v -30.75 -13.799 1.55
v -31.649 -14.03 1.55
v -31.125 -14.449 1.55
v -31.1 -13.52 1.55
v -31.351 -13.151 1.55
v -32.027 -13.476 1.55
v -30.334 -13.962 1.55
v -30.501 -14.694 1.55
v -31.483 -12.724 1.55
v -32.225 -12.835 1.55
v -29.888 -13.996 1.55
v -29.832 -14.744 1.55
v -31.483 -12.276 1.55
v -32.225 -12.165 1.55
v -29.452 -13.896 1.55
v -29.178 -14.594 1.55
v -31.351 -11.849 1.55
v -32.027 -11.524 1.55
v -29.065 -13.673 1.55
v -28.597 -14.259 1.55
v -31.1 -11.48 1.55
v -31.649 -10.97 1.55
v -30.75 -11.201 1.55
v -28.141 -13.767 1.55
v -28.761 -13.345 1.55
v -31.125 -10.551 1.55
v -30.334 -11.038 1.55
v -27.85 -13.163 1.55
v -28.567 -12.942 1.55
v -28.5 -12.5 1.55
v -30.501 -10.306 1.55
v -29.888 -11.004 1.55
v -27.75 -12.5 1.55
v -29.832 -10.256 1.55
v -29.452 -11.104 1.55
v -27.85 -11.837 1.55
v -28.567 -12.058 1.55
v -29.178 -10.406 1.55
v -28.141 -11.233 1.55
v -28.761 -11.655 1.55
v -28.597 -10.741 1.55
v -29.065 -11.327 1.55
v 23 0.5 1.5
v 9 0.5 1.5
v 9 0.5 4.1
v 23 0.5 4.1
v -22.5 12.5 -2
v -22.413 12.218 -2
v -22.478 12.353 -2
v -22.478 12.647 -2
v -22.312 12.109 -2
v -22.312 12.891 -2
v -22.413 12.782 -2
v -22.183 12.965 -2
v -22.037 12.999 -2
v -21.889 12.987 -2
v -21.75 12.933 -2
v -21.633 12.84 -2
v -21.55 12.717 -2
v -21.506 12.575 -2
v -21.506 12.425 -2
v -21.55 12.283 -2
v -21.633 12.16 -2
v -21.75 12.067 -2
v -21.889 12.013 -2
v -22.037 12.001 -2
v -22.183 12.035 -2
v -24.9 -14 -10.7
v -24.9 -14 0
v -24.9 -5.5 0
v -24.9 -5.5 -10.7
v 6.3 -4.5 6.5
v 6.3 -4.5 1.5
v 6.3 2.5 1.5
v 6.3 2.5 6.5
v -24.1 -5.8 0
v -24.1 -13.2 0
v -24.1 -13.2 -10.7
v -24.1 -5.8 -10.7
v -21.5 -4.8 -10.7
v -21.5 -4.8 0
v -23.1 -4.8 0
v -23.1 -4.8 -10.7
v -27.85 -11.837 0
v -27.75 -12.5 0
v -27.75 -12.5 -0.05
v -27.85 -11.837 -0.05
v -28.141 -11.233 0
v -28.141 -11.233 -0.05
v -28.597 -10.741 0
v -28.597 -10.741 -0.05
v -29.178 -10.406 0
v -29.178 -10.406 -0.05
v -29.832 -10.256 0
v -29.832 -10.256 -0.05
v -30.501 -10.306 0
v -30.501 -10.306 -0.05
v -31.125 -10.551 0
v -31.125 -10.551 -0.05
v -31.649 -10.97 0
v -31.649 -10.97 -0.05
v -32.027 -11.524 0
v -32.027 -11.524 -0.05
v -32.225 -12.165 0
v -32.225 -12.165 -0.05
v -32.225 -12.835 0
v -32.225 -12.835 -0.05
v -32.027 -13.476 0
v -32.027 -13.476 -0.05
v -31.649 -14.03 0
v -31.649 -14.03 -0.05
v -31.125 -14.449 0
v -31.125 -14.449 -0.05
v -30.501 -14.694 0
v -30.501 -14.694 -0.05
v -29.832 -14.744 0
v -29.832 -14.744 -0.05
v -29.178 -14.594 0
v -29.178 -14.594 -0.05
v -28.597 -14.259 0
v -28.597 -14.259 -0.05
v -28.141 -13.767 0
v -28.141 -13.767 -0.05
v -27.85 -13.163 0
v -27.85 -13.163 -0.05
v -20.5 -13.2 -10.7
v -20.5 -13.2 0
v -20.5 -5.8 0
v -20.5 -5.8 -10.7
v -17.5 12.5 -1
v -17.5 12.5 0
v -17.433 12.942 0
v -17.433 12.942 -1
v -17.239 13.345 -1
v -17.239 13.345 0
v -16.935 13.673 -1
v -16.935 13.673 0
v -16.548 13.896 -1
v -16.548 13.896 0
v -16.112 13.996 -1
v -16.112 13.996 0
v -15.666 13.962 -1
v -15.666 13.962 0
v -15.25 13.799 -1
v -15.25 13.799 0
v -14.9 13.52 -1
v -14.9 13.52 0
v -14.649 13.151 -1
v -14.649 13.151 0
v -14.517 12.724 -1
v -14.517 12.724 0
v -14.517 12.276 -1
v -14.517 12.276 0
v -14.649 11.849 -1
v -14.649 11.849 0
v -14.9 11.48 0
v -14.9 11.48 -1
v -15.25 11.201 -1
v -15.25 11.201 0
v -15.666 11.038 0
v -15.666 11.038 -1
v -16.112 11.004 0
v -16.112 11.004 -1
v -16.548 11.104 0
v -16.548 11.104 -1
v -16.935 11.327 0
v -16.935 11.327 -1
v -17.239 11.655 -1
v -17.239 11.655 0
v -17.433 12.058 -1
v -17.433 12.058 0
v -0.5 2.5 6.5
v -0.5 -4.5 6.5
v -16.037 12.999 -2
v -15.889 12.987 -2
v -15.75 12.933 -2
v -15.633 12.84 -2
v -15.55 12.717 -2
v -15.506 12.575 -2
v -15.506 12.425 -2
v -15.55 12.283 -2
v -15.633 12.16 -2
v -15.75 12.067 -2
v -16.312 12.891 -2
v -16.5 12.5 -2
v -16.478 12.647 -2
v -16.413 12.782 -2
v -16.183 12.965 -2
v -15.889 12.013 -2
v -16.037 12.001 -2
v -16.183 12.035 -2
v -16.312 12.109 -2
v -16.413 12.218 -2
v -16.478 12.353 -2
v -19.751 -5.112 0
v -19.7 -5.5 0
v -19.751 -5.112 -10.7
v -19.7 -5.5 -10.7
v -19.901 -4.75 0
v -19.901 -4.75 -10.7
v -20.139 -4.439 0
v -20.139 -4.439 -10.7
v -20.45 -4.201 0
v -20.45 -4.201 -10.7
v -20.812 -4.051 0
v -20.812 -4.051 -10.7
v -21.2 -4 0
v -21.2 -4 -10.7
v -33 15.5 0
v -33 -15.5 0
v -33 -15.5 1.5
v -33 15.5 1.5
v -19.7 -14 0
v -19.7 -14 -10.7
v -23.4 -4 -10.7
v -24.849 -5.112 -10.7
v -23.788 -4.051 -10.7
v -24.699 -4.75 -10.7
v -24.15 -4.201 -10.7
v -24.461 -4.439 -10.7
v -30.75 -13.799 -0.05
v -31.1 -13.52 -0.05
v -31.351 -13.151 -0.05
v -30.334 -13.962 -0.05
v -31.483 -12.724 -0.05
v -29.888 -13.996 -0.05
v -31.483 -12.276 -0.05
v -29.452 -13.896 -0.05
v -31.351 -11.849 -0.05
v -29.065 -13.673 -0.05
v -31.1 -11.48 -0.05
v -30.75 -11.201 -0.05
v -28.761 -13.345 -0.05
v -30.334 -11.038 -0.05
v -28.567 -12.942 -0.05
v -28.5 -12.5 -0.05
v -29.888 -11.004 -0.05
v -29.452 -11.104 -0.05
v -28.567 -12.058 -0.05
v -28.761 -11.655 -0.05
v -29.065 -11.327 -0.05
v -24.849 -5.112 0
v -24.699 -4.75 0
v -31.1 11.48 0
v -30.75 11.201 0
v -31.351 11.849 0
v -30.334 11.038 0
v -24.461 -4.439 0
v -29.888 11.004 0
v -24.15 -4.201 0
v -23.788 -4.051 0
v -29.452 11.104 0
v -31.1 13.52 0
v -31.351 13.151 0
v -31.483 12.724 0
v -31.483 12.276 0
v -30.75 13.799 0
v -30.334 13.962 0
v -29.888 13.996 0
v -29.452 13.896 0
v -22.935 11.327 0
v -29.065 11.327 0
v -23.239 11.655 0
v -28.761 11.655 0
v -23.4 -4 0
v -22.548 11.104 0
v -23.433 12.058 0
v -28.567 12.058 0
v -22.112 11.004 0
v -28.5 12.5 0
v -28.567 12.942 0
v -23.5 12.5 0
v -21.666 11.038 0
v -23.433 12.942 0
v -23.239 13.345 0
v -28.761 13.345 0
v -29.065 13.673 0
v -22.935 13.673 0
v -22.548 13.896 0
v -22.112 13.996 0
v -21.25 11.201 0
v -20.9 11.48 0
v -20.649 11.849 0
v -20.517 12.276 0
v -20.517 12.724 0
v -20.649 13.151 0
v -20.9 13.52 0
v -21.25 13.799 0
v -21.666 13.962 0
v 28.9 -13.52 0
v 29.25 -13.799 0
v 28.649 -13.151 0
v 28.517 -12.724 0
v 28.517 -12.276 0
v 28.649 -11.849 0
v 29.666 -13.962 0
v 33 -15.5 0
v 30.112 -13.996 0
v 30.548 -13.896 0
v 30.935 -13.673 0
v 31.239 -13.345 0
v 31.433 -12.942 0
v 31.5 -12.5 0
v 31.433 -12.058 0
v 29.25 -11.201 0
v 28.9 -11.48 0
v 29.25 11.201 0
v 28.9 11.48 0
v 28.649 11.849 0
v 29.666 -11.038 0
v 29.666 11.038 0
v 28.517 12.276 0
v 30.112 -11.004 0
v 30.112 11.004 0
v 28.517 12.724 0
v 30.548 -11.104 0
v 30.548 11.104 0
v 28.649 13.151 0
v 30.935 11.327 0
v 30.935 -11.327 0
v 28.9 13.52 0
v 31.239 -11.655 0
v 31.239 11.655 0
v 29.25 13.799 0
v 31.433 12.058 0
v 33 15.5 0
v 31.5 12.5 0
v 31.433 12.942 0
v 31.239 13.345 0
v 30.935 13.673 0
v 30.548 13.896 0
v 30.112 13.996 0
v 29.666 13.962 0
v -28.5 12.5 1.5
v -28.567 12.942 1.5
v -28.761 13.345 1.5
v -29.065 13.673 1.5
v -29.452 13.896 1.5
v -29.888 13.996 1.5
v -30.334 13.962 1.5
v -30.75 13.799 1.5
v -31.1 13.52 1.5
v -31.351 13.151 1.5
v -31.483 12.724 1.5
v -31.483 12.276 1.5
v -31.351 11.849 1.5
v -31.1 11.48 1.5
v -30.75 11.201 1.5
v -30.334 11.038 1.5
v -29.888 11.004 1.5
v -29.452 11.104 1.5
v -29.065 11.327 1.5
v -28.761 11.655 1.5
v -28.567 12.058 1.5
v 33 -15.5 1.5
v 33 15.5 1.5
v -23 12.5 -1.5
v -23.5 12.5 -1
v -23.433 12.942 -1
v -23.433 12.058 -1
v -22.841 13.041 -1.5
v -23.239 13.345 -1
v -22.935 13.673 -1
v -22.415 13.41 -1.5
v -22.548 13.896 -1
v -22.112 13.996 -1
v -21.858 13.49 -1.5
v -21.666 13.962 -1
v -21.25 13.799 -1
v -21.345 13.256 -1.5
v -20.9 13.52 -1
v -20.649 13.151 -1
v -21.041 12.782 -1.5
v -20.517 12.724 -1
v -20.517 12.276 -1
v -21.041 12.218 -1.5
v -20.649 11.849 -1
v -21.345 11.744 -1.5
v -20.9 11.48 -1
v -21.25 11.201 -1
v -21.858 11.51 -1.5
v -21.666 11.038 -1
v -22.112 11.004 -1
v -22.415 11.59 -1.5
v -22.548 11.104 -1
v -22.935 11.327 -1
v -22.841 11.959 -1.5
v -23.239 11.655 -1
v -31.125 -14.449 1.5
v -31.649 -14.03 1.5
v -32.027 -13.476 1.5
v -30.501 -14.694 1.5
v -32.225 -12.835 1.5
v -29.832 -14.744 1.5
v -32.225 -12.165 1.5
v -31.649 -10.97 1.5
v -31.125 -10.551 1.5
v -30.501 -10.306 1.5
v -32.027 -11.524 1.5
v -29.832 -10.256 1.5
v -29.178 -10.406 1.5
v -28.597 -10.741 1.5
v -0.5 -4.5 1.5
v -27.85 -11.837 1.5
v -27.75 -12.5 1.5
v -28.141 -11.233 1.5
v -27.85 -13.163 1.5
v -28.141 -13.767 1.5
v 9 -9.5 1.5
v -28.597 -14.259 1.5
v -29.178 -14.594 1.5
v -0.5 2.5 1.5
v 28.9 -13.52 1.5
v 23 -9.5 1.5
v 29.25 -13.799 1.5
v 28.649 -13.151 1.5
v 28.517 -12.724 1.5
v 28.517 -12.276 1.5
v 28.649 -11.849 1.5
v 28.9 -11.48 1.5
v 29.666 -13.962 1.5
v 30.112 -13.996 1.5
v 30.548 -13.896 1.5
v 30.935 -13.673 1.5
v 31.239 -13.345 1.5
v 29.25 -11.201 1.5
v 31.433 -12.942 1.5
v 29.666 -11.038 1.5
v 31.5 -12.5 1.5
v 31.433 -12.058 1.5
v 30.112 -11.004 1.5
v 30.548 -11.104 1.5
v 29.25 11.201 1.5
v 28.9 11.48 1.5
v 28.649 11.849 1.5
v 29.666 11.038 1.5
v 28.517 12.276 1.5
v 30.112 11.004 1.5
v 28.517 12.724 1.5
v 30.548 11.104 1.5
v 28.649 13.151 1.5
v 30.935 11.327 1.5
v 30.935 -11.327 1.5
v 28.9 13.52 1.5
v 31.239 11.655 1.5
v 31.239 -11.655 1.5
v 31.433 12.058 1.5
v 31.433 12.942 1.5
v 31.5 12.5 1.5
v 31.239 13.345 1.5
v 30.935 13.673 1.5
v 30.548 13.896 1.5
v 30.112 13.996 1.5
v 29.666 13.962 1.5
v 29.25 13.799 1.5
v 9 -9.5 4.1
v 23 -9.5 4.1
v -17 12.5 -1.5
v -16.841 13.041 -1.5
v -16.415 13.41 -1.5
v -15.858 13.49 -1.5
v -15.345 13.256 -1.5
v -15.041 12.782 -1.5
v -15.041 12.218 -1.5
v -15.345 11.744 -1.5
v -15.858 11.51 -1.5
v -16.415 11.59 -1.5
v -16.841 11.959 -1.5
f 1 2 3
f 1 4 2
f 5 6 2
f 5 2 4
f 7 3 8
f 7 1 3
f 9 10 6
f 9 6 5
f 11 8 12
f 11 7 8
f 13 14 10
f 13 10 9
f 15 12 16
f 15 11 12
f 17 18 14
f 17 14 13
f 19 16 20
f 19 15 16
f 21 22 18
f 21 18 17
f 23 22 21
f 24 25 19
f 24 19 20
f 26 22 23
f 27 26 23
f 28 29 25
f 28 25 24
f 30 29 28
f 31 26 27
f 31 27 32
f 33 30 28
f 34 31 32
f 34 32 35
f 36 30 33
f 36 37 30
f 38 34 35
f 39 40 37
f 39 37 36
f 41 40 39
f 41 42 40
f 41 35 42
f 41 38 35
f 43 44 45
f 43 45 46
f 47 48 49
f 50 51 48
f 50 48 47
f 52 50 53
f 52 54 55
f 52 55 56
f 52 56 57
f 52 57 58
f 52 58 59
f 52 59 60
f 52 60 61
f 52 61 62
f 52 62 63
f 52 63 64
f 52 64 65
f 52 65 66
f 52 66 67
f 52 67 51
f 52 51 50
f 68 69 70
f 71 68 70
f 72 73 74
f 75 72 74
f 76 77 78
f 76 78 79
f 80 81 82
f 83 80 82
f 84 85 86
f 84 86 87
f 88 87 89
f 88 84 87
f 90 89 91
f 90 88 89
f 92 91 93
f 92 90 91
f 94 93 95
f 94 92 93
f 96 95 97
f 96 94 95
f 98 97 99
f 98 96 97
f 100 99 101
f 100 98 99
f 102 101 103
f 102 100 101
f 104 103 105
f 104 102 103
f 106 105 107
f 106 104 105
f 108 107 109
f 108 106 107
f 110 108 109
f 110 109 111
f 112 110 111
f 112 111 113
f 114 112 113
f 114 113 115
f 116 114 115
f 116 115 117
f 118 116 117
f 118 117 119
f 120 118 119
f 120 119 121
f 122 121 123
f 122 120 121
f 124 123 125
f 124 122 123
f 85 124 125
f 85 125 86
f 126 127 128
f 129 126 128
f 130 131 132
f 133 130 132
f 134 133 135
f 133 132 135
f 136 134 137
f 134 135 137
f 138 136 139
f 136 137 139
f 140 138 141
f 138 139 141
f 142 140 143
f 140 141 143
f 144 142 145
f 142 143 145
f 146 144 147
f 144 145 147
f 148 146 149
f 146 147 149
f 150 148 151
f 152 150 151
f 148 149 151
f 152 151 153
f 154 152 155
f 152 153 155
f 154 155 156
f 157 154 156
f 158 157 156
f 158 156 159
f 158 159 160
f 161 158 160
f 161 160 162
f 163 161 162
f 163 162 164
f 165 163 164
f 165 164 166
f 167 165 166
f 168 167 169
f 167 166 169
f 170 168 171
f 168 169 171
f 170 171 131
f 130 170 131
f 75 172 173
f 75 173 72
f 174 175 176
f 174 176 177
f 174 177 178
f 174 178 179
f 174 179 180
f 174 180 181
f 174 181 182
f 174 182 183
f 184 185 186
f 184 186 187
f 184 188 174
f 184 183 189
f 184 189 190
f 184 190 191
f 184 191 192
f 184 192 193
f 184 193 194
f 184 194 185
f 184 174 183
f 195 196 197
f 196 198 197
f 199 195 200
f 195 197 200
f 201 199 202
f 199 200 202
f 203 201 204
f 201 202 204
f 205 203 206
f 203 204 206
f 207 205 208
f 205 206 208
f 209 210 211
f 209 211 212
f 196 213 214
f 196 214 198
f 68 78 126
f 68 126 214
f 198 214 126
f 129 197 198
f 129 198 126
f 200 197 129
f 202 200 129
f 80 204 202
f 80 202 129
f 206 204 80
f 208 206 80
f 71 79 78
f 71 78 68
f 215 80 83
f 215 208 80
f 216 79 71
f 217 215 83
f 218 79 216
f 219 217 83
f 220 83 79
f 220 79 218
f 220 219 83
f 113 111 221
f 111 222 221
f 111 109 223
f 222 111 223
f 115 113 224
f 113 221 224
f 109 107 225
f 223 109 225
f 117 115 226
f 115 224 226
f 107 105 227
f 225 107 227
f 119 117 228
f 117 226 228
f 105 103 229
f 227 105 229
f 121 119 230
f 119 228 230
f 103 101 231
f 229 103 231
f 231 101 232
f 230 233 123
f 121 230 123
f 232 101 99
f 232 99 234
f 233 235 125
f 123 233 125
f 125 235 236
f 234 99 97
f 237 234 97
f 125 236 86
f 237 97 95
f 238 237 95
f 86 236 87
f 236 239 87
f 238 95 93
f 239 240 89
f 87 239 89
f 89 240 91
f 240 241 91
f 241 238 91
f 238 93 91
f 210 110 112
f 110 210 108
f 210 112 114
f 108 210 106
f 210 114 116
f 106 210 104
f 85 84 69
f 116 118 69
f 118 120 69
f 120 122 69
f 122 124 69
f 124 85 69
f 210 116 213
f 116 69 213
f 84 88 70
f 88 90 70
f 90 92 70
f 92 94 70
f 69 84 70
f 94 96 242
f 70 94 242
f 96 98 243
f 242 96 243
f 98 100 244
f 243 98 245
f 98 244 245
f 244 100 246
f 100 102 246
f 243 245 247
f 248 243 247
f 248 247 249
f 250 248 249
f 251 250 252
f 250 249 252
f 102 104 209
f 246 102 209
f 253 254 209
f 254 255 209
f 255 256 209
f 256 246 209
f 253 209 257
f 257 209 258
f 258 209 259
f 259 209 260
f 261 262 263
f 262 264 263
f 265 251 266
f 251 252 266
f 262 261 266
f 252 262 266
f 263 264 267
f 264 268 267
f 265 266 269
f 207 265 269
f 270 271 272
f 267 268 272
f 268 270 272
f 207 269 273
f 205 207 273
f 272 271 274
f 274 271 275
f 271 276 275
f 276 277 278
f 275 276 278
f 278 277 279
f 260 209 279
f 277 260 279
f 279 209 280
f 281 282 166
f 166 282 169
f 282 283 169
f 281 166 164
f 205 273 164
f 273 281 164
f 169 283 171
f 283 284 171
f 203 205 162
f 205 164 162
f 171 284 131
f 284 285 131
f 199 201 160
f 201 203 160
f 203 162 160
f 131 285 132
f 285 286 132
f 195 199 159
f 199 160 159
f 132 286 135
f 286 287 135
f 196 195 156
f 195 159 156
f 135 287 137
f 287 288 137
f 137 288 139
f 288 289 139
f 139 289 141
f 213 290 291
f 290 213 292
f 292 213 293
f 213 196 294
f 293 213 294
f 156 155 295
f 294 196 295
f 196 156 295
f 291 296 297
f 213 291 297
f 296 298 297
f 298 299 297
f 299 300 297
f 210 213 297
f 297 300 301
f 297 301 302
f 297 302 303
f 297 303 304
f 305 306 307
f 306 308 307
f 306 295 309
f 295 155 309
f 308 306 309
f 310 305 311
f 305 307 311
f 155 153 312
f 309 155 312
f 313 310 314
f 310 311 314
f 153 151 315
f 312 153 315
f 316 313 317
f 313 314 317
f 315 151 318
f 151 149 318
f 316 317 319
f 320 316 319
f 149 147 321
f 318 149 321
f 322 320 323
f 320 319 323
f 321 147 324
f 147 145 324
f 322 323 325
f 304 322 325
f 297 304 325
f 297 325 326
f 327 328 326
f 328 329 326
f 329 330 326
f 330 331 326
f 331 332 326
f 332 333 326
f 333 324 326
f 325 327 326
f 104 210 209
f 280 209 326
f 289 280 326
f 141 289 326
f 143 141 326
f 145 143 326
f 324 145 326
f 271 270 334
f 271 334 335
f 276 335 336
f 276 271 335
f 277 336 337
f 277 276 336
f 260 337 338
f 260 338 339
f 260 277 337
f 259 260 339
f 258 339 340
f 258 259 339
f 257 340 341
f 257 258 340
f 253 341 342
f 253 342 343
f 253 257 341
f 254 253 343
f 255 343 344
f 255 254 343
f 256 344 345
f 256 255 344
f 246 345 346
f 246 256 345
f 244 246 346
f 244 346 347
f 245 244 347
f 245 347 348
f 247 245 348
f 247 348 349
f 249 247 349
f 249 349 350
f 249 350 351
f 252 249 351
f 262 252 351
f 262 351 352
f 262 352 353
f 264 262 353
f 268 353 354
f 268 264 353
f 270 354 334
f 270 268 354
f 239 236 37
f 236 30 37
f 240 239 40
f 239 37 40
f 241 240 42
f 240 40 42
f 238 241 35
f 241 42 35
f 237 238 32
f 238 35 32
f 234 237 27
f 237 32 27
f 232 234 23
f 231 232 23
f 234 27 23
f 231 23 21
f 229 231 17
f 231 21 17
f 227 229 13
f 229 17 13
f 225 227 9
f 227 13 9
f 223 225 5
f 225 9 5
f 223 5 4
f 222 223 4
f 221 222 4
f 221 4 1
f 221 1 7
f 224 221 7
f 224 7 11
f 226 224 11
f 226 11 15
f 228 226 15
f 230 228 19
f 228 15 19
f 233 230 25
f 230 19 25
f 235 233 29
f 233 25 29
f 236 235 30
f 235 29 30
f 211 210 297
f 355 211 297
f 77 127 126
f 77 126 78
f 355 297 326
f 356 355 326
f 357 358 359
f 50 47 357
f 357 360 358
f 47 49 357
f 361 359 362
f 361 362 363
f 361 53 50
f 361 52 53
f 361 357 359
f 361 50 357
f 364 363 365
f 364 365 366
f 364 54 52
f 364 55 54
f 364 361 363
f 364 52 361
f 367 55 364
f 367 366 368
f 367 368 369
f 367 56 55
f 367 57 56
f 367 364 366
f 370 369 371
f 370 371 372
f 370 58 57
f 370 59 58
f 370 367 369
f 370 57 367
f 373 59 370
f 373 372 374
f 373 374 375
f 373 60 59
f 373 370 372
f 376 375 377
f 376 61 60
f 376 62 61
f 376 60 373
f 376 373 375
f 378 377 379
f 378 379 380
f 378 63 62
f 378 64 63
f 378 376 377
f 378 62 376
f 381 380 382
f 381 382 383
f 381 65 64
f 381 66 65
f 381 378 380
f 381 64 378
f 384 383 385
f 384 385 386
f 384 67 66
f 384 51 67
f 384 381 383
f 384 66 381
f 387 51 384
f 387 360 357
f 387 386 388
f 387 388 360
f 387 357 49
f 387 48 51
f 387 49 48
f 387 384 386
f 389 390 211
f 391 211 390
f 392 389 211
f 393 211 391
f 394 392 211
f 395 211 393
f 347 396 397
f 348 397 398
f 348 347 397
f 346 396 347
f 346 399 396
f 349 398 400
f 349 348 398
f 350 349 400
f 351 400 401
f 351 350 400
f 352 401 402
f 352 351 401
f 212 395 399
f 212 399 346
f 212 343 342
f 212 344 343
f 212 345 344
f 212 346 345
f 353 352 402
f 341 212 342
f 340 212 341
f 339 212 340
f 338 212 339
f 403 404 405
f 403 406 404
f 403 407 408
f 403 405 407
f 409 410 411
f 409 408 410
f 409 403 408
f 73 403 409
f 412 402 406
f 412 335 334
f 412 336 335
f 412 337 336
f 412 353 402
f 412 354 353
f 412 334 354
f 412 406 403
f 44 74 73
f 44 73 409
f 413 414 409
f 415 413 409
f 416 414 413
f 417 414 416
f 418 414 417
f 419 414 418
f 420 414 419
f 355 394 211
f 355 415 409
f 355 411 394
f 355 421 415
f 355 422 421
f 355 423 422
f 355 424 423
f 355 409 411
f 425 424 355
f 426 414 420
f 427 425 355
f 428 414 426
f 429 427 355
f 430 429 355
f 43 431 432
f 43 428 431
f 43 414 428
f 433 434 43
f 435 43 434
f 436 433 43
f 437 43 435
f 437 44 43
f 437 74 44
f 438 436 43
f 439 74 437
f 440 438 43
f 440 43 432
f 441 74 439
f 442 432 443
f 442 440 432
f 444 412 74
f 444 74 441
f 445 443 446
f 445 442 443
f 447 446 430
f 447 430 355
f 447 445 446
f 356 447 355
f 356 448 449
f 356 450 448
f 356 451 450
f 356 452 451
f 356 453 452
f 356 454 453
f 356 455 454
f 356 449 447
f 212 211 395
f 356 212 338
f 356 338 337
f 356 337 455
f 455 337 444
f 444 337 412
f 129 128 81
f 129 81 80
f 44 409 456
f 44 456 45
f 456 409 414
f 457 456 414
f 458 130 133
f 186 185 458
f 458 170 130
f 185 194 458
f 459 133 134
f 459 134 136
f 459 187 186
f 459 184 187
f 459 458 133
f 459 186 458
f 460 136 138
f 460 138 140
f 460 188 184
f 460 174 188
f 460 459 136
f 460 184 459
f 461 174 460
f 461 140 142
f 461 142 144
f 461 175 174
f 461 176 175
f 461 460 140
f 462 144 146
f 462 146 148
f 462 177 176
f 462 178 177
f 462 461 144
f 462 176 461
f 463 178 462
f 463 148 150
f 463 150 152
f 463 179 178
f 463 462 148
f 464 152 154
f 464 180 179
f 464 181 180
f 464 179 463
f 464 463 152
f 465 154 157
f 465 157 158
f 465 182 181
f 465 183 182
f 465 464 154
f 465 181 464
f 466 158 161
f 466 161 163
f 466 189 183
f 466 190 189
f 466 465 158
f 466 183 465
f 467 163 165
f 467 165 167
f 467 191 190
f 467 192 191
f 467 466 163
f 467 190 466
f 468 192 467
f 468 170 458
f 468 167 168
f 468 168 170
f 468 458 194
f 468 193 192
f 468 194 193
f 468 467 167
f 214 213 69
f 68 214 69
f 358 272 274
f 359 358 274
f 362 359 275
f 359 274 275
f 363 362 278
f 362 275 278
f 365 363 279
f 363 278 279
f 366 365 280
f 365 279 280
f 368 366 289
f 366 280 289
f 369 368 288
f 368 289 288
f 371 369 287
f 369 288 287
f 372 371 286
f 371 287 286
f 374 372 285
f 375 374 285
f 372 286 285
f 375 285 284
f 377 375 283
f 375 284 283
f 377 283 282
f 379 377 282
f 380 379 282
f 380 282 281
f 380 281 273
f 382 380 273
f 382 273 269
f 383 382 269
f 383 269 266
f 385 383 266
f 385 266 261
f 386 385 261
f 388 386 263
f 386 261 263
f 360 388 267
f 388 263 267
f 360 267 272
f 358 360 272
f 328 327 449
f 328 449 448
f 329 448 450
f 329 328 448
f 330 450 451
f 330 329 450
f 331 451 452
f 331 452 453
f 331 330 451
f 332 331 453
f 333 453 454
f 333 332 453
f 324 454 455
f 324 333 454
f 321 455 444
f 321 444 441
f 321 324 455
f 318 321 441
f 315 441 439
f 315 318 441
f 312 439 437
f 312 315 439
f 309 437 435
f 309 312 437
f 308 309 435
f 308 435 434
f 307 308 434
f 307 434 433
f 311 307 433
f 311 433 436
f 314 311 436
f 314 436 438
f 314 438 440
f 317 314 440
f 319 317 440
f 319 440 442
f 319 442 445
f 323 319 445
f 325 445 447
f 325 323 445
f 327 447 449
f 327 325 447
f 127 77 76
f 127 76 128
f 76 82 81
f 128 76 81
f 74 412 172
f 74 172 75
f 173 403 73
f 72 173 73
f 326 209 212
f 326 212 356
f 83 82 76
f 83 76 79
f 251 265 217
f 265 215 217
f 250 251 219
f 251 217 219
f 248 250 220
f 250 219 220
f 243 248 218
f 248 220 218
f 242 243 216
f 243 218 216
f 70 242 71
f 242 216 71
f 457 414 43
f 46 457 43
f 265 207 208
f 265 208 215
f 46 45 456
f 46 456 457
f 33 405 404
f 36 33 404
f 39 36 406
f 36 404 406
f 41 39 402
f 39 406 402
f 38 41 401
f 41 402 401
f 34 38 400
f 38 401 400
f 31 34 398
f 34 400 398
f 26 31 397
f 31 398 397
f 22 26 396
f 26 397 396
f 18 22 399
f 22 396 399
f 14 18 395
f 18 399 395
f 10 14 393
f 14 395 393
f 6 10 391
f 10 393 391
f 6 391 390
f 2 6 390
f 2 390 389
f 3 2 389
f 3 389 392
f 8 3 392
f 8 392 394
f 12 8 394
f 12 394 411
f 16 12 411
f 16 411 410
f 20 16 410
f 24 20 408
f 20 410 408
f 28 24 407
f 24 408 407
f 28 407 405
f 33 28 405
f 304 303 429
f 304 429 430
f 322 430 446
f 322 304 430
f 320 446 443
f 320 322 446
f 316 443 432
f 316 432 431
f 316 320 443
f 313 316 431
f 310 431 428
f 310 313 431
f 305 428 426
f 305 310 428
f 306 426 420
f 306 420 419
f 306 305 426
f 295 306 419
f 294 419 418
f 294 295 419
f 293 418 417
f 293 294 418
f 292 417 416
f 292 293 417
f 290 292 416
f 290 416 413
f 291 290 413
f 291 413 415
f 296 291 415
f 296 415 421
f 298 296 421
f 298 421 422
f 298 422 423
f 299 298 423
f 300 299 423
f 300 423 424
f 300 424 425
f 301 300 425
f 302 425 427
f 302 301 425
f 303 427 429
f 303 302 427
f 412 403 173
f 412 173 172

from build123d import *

# Parameters (mm, degrees)
SKETCH1_W           = 66
SKETCH1_H           = 31
SKETCH1_R           = 1.5
BOSS_EXTRUDE1_DEPTH = 1.5
SKETCH2_W           = 14
SKETCH2_H           = 10
BOSS_EXTRUDE2_DEPTH = 2.6
SKETCH3_W           = 6.8
SKETCH3_H           = 7
BOSS_EXTRUDE3_DEPTH = 5
SKETCH4_R           = 2.25
SKETCH4_R_2         = 1.5
BOSS_EXTRUDE4_DEPTH = 0.05
SKETCH5_W           = 5.2
SKETCH5_H           = 10
SKETCH5_W_2         = 3.6
SKETCH5_H_2         = 8.4
BOSS_EXTRUDE5_DEPTH = 10.7
CHAMFER1_SIZE       = 1
FILLET1_R           = 1.5
SKETCH6_R           = 1.5
BOSS_EXTRUDE6_DEPTH = 2
CHAMFER2_SIZE       = 1


with BuildPart() as part:
    # Sketch1 → Boss-Extrude1 (new body)
    with BuildSketch(Plane.XY):
        Rectangle(SKETCH1_W, SKETCH1_H)
        with Locations((30, 12.5)):
            Circle(SKETCH1_R, mode=Mode.SUBTRACT)
        with Locations((30, -12.5)):
            Circle(SKETCH1_R, mode=Mode.SUBTRACT)
        with Locations((-30, -12.5)):
            Circle(SKETCH1_R, mode=Mode.SUBTRACT)
        with Locations((-30, 12.5)):
            Circle(SKETCH1_R, mode=Mode.SUBTRACT)
    extrude(amount=BOSS_EXTRUDE1_DEPTH)

    # Sketch2 → Boss-Extrude2 (add)
    with BuildSketch(Plane.XY.offset(1.5)):
        with Locations((16, -4.5)):
            Rectangle(SKETCH2_W, SKETCH2_H)
    extrude(amount=BOSS_EXTRUDE2_DEPTH)

    # Sketch3 → Boss-Extrude3 (add)
    with BuildSketch(Plane.XY.offset(1.5)):
        with Locations((2.9, -1)):
            Rectangle(SKETCH3_W, SKETCH3_H)
    extrude(amount=BOSS_EXTRUDE3_DEPTH)

    # Sketch4 → Boss-Extrude4 (add)
    with BuildSketch(Plane.XY.offset(1.5)):
        with Locations((-30, -12.5)):
            Circle(SKETCH4_R)
        with Locations((-30, -12.5)):
            Circle(SKETCH4_R_2, mode=Mode.SUBTRACT)
    boss_extrude4 = extrude(amount=BOSS_EXTRUDE4_DEPTH)

    # Mirror1: Boss-Extrude4 across plane
    add(boss_extrude4.mirror(Plane.XY.offset(0.75)))

    # Sketch5 → Boss-Extrude5 (add)
    with BuildSketch(Plane(origin=(0, 0, 0), x_dir=(-1, 0, 0), z_dir=(0, 0, -1))):
        with Locations((22.3, -9)):
            Rectangle(SKETCH5_W, SKETCH5_H)
        with Locations((22.3, -9)):
            Rectangle(SKETCH5_W_2, SKETCH5_H_2, mode=Mode.SUBTRACT)
    extrude(amount=BOSS_EXTRUDE5_DEPTH)

    # Chamfer1
    chamfer1_edges = [part.edges().sort_by_distance(p)[0] for p in [
        (-24.1, -4.8, -5.35),
        (-20.5, -4.8, -5.35),
    ]]
    chamfer(chamfer1_edges, length=CHAMFER1_SIZE)

    # Fillet1
    fillet1_edges = [part.edges().sort_by_distance(p)[0] for p in [
        (-24.9, -4, -5.35),
        (-19.7, -4, -5.35),
    ]]
    fillet(fillet1_edges, radius=FILLET1_R)

    # Sketch6 → Boss-Extrude6 (add)
    with BuildSketch(Plane(origin=(0, 0, 0), x_dir=(-1, 0, 0), z_dir=(0, 0, -1))):
        with Locations((16, 12.5)):
            Circle(SKETCH6_R)
        with Locations((22, 12.5)):
            Circle(SKETCH6_R)
    extrude(amount=BOSS_EXTRUDE6_DEPTH)

    # Chamfer2
    chamfer2_edges = [part.edges().sort_by_distance(p)[0] for p in [
        (-14.5, 12.5, -2),
        (-20.5, 12.5, -2),
    ]]
    chamfer(chamfer2_edges, length=CHAMFER2_SIZE)


solid = part.part
